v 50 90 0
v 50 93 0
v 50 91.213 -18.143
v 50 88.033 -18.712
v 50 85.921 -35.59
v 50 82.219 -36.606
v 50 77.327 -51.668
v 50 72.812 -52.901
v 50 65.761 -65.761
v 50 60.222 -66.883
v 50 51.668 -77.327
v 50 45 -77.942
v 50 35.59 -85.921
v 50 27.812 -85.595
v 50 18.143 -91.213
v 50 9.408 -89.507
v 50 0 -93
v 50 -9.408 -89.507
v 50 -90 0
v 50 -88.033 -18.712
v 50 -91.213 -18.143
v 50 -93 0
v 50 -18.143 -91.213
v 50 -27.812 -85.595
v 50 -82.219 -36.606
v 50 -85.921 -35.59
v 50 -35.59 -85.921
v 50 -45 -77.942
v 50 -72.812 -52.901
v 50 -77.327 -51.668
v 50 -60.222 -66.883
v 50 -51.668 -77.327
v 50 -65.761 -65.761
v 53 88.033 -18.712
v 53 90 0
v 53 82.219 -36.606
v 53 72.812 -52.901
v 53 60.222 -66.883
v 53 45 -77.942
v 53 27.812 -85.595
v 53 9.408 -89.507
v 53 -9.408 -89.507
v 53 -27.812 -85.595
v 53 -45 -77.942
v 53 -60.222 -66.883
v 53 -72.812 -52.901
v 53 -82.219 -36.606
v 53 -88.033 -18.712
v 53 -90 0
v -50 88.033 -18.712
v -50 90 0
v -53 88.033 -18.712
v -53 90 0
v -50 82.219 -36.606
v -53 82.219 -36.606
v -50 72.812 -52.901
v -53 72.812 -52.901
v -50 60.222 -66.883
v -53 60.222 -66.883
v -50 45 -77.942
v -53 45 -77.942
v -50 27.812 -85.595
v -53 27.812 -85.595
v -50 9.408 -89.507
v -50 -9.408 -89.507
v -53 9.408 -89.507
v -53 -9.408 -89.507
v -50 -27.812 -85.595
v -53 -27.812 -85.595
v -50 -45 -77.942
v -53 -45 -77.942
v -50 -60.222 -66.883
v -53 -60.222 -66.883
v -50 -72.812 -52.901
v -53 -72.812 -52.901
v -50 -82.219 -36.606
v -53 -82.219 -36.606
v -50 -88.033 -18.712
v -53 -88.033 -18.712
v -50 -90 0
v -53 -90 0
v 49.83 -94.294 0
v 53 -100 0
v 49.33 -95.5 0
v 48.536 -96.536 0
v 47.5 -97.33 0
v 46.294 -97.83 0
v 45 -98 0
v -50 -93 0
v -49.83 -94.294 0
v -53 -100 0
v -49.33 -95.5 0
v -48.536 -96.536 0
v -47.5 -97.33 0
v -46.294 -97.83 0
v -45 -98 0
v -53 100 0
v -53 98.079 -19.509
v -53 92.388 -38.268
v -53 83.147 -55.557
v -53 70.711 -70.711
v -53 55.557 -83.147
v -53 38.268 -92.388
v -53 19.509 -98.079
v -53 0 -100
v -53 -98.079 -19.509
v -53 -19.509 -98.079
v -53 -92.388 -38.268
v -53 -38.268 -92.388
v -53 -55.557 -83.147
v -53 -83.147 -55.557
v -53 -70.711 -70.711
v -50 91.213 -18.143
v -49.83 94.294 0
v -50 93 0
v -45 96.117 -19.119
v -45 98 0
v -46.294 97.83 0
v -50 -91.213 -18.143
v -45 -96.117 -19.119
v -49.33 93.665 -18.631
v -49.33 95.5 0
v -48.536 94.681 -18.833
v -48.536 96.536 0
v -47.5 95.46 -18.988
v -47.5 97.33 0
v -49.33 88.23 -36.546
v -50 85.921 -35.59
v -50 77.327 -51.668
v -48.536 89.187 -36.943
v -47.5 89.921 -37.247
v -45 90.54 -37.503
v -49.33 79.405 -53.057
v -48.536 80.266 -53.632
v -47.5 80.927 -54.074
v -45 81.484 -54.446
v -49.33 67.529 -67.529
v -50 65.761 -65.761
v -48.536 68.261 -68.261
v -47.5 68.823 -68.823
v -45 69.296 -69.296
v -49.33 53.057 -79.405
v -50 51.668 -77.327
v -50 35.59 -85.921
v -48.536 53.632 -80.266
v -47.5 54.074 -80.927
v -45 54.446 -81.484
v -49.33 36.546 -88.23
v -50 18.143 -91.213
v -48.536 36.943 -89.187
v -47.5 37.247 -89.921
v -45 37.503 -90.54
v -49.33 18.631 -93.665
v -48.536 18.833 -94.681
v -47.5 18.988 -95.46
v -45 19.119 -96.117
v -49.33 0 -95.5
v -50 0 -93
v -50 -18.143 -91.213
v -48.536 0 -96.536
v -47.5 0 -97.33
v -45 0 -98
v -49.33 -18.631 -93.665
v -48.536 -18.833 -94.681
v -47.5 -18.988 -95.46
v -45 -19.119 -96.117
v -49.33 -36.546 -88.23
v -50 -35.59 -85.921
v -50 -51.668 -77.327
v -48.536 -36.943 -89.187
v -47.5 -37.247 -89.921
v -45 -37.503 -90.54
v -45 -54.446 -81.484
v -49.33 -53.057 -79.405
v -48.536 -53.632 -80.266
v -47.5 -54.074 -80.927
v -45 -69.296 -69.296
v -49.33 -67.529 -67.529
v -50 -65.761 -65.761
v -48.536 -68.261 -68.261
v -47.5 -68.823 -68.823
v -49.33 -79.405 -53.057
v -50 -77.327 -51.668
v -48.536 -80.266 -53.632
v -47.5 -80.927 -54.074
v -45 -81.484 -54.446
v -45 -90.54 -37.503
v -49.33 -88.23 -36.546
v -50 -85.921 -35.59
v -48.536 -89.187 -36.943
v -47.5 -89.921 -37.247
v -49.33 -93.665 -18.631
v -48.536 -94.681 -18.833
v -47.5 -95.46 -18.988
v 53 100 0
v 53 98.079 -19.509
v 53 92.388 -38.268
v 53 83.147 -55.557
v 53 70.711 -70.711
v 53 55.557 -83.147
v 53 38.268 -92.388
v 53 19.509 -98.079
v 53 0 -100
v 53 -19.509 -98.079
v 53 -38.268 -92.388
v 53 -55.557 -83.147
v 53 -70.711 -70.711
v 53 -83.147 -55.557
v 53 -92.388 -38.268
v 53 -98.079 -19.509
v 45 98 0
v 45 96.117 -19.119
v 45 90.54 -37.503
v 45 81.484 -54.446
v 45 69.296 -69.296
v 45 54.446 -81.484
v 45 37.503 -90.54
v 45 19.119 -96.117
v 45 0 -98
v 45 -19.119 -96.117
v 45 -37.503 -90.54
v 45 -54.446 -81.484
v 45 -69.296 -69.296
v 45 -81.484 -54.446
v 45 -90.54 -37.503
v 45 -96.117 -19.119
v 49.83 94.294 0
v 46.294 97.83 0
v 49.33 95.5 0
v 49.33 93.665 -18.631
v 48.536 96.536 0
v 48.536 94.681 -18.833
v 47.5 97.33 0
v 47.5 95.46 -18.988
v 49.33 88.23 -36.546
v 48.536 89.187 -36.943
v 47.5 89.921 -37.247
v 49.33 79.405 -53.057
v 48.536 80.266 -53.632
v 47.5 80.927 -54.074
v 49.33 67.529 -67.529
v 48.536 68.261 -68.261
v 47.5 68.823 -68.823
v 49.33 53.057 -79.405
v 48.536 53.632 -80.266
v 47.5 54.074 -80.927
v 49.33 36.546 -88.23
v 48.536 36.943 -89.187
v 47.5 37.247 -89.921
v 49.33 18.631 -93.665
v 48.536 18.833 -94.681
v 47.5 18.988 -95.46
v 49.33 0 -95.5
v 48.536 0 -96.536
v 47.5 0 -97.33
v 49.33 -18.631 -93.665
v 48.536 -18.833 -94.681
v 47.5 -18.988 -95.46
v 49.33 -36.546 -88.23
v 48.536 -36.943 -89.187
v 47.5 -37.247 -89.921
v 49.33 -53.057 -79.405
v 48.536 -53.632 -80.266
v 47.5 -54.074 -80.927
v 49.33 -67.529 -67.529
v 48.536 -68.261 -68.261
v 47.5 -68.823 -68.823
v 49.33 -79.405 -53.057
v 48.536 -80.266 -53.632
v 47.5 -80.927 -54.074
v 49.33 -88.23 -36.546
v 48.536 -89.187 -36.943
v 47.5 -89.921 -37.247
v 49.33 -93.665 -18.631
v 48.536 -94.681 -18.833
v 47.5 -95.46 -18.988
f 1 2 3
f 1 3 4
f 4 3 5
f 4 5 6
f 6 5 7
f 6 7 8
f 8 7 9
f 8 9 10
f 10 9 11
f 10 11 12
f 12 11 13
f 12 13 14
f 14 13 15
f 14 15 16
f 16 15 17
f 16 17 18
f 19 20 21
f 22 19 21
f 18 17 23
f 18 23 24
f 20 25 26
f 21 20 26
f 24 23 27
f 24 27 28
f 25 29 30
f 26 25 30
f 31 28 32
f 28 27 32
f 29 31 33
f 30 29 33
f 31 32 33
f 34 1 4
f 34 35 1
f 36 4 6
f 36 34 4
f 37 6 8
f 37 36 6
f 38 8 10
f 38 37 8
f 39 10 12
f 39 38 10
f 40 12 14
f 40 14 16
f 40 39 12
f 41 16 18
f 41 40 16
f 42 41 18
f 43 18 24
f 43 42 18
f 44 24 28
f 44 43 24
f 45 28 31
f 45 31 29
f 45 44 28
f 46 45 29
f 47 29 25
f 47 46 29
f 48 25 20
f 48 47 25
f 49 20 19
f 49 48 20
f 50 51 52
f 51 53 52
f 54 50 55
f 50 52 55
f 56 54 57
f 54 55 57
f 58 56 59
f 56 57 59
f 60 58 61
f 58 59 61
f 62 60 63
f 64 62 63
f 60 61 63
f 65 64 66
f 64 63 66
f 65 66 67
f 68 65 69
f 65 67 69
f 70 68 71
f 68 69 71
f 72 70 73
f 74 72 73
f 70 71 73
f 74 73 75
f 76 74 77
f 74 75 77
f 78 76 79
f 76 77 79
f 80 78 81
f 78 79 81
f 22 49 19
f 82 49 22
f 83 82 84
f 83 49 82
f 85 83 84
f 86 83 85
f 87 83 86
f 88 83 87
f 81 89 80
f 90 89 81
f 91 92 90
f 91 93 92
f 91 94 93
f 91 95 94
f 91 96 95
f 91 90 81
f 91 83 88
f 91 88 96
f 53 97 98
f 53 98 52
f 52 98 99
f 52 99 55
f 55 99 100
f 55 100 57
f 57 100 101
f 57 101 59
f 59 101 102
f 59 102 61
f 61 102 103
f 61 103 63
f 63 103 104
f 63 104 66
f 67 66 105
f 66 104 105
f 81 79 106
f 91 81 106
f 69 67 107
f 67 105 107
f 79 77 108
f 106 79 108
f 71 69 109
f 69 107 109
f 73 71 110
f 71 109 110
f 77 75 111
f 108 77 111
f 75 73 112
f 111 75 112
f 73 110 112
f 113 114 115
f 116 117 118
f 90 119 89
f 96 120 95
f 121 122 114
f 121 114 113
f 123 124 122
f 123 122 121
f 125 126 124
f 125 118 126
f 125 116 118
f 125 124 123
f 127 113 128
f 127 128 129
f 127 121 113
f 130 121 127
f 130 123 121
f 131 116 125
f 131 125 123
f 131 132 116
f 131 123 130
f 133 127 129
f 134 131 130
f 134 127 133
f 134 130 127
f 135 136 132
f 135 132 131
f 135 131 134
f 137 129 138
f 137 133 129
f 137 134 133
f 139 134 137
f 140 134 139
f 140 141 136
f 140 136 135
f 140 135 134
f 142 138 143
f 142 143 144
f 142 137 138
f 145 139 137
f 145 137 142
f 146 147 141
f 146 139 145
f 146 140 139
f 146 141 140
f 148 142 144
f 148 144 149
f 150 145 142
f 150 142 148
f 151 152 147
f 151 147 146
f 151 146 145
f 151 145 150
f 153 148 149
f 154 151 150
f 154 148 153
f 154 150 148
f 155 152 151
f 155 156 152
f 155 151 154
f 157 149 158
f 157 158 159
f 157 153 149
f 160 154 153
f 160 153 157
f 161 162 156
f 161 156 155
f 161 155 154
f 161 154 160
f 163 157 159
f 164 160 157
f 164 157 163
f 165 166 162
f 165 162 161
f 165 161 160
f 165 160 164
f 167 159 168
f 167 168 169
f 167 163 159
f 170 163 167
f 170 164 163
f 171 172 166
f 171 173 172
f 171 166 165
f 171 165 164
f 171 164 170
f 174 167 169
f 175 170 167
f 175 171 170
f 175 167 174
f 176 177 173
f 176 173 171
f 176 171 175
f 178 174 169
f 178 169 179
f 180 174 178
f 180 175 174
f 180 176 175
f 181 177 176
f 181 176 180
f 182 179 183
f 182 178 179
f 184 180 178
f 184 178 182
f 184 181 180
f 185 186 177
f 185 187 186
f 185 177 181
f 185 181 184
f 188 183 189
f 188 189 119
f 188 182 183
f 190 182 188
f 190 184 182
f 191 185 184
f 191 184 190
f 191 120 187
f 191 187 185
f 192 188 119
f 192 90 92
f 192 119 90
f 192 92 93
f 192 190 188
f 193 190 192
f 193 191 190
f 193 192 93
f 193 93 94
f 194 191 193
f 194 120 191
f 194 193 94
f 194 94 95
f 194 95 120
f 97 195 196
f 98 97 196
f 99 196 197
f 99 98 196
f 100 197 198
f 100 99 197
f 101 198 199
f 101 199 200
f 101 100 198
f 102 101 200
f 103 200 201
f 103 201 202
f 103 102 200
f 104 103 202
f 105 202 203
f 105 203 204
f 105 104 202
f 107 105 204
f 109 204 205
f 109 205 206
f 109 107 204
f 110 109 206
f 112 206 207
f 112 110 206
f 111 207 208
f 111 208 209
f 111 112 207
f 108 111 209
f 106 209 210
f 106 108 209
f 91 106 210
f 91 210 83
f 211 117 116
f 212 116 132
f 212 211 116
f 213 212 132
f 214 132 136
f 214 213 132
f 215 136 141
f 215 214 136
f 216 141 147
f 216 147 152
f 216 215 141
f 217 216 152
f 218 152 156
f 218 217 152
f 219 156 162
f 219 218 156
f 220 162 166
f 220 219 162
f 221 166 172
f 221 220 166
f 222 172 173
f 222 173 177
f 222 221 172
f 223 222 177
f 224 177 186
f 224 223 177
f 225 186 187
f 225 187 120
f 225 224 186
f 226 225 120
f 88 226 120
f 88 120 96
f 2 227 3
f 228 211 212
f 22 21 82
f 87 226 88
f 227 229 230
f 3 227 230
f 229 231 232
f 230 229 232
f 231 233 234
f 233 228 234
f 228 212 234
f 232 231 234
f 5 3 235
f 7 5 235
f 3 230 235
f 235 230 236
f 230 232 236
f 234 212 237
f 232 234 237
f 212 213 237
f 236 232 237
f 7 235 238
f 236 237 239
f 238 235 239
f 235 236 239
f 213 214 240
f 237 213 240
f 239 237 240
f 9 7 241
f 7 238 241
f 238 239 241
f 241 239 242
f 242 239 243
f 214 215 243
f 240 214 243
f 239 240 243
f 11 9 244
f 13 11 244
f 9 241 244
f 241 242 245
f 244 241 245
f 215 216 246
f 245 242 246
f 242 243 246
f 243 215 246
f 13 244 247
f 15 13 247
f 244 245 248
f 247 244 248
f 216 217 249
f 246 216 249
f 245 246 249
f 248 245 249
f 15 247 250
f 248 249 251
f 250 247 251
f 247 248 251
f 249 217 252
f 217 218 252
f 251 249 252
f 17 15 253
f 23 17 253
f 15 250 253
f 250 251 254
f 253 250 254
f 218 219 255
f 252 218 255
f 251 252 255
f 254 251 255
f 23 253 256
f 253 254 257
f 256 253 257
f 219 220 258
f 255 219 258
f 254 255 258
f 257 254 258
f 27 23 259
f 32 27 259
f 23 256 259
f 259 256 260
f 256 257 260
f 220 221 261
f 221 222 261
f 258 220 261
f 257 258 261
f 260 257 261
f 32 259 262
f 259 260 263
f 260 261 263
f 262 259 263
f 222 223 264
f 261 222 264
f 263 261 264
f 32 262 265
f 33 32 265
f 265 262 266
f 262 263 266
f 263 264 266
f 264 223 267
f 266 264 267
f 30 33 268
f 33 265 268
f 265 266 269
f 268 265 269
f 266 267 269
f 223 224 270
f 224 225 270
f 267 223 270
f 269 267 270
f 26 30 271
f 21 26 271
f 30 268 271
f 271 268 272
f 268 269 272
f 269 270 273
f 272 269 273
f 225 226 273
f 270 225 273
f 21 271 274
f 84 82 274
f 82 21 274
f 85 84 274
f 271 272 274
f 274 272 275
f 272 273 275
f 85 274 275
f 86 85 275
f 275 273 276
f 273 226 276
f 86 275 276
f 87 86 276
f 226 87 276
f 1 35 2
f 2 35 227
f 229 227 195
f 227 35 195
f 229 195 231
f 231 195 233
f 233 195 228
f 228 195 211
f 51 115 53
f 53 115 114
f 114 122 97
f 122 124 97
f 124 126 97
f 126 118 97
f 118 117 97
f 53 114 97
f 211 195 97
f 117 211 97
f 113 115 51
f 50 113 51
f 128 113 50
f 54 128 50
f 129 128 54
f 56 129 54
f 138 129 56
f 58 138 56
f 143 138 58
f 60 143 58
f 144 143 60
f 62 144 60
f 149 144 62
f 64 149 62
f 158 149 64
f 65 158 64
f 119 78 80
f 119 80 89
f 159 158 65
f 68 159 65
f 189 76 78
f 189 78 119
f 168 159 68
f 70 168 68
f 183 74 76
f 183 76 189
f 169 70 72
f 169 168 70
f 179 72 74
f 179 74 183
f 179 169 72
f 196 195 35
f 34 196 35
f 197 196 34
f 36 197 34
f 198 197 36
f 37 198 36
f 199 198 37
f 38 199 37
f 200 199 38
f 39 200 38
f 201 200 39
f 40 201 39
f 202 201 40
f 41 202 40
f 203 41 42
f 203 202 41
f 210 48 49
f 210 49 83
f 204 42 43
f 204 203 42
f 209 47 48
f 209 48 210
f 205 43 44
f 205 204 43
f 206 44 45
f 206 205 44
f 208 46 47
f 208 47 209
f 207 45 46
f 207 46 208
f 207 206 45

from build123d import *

# Parameters (mm, degrees)
SKETCH_1_W             = 100
SKETCH_1_H             = 2
REVOLVE_1_ANGLE        = 180
SKETCH_3_W             = 3
SKETCH_3_H             = 10
REVOLVE_2_ANGLE        = 180
FILLET_1_R             = 5
FILLET_1_OF_MIRROR_1_R = 5


with BuildPart() as part:
    # ｽｹｯﾁ1 → 回転1 (revolve)
    with BuildSketch(Plane.XY):
        with Locations((0, 99)):
            Rectangle(SKETCH_1_W, SKETCH_1_H)
    revolve(axis=Axis((-50, 0, 0), (-1, 0, 0)), revolution_arc=REVOLVE_1_ANGLE)

    # ｽｹｯﾁ3 → 回転2 (revolve)
    with BuildSketch(Plane.XY):
        with Locations((51.5, 95)):
            Rectangle(SKETCH_3_W, SKETCH_3_H)
    revolve_2 = revolve(axis=Axis((-50, 0, 0), (-1, 0, 0)), revolution_arc=REVOLVE_2_ANGLE)

    # ﾌｨﾚｯﾄ1
    fillet_1_edges = [part.edges().sort_by_distance(p)[0] for p in [
        (50, 0, -98),
    ]]
    fillet(fillet_1_edges, radius=FILLET_1_R)

    # ﾐﾗｰ1: 回転2 across plane
    add(revolve_2.mirror(Plane(origin=(0, 0, 0), x_dir=(0, 0, 1), z_dir=(1, 0, 0))))

    # ﾌｨﾚｯﾄ1 of ﾐﾗｰ1
    fillet_1_of_mirror_1_edges = [part.edges().sort_by_distance(p)[0] for p in [
        (-50, 0, -98),
    ]]
    fillet(fillet_1_of_mirror_1_edges, radius=FILLET_1_OF_MIRROR_1_R)


solid = part.part
